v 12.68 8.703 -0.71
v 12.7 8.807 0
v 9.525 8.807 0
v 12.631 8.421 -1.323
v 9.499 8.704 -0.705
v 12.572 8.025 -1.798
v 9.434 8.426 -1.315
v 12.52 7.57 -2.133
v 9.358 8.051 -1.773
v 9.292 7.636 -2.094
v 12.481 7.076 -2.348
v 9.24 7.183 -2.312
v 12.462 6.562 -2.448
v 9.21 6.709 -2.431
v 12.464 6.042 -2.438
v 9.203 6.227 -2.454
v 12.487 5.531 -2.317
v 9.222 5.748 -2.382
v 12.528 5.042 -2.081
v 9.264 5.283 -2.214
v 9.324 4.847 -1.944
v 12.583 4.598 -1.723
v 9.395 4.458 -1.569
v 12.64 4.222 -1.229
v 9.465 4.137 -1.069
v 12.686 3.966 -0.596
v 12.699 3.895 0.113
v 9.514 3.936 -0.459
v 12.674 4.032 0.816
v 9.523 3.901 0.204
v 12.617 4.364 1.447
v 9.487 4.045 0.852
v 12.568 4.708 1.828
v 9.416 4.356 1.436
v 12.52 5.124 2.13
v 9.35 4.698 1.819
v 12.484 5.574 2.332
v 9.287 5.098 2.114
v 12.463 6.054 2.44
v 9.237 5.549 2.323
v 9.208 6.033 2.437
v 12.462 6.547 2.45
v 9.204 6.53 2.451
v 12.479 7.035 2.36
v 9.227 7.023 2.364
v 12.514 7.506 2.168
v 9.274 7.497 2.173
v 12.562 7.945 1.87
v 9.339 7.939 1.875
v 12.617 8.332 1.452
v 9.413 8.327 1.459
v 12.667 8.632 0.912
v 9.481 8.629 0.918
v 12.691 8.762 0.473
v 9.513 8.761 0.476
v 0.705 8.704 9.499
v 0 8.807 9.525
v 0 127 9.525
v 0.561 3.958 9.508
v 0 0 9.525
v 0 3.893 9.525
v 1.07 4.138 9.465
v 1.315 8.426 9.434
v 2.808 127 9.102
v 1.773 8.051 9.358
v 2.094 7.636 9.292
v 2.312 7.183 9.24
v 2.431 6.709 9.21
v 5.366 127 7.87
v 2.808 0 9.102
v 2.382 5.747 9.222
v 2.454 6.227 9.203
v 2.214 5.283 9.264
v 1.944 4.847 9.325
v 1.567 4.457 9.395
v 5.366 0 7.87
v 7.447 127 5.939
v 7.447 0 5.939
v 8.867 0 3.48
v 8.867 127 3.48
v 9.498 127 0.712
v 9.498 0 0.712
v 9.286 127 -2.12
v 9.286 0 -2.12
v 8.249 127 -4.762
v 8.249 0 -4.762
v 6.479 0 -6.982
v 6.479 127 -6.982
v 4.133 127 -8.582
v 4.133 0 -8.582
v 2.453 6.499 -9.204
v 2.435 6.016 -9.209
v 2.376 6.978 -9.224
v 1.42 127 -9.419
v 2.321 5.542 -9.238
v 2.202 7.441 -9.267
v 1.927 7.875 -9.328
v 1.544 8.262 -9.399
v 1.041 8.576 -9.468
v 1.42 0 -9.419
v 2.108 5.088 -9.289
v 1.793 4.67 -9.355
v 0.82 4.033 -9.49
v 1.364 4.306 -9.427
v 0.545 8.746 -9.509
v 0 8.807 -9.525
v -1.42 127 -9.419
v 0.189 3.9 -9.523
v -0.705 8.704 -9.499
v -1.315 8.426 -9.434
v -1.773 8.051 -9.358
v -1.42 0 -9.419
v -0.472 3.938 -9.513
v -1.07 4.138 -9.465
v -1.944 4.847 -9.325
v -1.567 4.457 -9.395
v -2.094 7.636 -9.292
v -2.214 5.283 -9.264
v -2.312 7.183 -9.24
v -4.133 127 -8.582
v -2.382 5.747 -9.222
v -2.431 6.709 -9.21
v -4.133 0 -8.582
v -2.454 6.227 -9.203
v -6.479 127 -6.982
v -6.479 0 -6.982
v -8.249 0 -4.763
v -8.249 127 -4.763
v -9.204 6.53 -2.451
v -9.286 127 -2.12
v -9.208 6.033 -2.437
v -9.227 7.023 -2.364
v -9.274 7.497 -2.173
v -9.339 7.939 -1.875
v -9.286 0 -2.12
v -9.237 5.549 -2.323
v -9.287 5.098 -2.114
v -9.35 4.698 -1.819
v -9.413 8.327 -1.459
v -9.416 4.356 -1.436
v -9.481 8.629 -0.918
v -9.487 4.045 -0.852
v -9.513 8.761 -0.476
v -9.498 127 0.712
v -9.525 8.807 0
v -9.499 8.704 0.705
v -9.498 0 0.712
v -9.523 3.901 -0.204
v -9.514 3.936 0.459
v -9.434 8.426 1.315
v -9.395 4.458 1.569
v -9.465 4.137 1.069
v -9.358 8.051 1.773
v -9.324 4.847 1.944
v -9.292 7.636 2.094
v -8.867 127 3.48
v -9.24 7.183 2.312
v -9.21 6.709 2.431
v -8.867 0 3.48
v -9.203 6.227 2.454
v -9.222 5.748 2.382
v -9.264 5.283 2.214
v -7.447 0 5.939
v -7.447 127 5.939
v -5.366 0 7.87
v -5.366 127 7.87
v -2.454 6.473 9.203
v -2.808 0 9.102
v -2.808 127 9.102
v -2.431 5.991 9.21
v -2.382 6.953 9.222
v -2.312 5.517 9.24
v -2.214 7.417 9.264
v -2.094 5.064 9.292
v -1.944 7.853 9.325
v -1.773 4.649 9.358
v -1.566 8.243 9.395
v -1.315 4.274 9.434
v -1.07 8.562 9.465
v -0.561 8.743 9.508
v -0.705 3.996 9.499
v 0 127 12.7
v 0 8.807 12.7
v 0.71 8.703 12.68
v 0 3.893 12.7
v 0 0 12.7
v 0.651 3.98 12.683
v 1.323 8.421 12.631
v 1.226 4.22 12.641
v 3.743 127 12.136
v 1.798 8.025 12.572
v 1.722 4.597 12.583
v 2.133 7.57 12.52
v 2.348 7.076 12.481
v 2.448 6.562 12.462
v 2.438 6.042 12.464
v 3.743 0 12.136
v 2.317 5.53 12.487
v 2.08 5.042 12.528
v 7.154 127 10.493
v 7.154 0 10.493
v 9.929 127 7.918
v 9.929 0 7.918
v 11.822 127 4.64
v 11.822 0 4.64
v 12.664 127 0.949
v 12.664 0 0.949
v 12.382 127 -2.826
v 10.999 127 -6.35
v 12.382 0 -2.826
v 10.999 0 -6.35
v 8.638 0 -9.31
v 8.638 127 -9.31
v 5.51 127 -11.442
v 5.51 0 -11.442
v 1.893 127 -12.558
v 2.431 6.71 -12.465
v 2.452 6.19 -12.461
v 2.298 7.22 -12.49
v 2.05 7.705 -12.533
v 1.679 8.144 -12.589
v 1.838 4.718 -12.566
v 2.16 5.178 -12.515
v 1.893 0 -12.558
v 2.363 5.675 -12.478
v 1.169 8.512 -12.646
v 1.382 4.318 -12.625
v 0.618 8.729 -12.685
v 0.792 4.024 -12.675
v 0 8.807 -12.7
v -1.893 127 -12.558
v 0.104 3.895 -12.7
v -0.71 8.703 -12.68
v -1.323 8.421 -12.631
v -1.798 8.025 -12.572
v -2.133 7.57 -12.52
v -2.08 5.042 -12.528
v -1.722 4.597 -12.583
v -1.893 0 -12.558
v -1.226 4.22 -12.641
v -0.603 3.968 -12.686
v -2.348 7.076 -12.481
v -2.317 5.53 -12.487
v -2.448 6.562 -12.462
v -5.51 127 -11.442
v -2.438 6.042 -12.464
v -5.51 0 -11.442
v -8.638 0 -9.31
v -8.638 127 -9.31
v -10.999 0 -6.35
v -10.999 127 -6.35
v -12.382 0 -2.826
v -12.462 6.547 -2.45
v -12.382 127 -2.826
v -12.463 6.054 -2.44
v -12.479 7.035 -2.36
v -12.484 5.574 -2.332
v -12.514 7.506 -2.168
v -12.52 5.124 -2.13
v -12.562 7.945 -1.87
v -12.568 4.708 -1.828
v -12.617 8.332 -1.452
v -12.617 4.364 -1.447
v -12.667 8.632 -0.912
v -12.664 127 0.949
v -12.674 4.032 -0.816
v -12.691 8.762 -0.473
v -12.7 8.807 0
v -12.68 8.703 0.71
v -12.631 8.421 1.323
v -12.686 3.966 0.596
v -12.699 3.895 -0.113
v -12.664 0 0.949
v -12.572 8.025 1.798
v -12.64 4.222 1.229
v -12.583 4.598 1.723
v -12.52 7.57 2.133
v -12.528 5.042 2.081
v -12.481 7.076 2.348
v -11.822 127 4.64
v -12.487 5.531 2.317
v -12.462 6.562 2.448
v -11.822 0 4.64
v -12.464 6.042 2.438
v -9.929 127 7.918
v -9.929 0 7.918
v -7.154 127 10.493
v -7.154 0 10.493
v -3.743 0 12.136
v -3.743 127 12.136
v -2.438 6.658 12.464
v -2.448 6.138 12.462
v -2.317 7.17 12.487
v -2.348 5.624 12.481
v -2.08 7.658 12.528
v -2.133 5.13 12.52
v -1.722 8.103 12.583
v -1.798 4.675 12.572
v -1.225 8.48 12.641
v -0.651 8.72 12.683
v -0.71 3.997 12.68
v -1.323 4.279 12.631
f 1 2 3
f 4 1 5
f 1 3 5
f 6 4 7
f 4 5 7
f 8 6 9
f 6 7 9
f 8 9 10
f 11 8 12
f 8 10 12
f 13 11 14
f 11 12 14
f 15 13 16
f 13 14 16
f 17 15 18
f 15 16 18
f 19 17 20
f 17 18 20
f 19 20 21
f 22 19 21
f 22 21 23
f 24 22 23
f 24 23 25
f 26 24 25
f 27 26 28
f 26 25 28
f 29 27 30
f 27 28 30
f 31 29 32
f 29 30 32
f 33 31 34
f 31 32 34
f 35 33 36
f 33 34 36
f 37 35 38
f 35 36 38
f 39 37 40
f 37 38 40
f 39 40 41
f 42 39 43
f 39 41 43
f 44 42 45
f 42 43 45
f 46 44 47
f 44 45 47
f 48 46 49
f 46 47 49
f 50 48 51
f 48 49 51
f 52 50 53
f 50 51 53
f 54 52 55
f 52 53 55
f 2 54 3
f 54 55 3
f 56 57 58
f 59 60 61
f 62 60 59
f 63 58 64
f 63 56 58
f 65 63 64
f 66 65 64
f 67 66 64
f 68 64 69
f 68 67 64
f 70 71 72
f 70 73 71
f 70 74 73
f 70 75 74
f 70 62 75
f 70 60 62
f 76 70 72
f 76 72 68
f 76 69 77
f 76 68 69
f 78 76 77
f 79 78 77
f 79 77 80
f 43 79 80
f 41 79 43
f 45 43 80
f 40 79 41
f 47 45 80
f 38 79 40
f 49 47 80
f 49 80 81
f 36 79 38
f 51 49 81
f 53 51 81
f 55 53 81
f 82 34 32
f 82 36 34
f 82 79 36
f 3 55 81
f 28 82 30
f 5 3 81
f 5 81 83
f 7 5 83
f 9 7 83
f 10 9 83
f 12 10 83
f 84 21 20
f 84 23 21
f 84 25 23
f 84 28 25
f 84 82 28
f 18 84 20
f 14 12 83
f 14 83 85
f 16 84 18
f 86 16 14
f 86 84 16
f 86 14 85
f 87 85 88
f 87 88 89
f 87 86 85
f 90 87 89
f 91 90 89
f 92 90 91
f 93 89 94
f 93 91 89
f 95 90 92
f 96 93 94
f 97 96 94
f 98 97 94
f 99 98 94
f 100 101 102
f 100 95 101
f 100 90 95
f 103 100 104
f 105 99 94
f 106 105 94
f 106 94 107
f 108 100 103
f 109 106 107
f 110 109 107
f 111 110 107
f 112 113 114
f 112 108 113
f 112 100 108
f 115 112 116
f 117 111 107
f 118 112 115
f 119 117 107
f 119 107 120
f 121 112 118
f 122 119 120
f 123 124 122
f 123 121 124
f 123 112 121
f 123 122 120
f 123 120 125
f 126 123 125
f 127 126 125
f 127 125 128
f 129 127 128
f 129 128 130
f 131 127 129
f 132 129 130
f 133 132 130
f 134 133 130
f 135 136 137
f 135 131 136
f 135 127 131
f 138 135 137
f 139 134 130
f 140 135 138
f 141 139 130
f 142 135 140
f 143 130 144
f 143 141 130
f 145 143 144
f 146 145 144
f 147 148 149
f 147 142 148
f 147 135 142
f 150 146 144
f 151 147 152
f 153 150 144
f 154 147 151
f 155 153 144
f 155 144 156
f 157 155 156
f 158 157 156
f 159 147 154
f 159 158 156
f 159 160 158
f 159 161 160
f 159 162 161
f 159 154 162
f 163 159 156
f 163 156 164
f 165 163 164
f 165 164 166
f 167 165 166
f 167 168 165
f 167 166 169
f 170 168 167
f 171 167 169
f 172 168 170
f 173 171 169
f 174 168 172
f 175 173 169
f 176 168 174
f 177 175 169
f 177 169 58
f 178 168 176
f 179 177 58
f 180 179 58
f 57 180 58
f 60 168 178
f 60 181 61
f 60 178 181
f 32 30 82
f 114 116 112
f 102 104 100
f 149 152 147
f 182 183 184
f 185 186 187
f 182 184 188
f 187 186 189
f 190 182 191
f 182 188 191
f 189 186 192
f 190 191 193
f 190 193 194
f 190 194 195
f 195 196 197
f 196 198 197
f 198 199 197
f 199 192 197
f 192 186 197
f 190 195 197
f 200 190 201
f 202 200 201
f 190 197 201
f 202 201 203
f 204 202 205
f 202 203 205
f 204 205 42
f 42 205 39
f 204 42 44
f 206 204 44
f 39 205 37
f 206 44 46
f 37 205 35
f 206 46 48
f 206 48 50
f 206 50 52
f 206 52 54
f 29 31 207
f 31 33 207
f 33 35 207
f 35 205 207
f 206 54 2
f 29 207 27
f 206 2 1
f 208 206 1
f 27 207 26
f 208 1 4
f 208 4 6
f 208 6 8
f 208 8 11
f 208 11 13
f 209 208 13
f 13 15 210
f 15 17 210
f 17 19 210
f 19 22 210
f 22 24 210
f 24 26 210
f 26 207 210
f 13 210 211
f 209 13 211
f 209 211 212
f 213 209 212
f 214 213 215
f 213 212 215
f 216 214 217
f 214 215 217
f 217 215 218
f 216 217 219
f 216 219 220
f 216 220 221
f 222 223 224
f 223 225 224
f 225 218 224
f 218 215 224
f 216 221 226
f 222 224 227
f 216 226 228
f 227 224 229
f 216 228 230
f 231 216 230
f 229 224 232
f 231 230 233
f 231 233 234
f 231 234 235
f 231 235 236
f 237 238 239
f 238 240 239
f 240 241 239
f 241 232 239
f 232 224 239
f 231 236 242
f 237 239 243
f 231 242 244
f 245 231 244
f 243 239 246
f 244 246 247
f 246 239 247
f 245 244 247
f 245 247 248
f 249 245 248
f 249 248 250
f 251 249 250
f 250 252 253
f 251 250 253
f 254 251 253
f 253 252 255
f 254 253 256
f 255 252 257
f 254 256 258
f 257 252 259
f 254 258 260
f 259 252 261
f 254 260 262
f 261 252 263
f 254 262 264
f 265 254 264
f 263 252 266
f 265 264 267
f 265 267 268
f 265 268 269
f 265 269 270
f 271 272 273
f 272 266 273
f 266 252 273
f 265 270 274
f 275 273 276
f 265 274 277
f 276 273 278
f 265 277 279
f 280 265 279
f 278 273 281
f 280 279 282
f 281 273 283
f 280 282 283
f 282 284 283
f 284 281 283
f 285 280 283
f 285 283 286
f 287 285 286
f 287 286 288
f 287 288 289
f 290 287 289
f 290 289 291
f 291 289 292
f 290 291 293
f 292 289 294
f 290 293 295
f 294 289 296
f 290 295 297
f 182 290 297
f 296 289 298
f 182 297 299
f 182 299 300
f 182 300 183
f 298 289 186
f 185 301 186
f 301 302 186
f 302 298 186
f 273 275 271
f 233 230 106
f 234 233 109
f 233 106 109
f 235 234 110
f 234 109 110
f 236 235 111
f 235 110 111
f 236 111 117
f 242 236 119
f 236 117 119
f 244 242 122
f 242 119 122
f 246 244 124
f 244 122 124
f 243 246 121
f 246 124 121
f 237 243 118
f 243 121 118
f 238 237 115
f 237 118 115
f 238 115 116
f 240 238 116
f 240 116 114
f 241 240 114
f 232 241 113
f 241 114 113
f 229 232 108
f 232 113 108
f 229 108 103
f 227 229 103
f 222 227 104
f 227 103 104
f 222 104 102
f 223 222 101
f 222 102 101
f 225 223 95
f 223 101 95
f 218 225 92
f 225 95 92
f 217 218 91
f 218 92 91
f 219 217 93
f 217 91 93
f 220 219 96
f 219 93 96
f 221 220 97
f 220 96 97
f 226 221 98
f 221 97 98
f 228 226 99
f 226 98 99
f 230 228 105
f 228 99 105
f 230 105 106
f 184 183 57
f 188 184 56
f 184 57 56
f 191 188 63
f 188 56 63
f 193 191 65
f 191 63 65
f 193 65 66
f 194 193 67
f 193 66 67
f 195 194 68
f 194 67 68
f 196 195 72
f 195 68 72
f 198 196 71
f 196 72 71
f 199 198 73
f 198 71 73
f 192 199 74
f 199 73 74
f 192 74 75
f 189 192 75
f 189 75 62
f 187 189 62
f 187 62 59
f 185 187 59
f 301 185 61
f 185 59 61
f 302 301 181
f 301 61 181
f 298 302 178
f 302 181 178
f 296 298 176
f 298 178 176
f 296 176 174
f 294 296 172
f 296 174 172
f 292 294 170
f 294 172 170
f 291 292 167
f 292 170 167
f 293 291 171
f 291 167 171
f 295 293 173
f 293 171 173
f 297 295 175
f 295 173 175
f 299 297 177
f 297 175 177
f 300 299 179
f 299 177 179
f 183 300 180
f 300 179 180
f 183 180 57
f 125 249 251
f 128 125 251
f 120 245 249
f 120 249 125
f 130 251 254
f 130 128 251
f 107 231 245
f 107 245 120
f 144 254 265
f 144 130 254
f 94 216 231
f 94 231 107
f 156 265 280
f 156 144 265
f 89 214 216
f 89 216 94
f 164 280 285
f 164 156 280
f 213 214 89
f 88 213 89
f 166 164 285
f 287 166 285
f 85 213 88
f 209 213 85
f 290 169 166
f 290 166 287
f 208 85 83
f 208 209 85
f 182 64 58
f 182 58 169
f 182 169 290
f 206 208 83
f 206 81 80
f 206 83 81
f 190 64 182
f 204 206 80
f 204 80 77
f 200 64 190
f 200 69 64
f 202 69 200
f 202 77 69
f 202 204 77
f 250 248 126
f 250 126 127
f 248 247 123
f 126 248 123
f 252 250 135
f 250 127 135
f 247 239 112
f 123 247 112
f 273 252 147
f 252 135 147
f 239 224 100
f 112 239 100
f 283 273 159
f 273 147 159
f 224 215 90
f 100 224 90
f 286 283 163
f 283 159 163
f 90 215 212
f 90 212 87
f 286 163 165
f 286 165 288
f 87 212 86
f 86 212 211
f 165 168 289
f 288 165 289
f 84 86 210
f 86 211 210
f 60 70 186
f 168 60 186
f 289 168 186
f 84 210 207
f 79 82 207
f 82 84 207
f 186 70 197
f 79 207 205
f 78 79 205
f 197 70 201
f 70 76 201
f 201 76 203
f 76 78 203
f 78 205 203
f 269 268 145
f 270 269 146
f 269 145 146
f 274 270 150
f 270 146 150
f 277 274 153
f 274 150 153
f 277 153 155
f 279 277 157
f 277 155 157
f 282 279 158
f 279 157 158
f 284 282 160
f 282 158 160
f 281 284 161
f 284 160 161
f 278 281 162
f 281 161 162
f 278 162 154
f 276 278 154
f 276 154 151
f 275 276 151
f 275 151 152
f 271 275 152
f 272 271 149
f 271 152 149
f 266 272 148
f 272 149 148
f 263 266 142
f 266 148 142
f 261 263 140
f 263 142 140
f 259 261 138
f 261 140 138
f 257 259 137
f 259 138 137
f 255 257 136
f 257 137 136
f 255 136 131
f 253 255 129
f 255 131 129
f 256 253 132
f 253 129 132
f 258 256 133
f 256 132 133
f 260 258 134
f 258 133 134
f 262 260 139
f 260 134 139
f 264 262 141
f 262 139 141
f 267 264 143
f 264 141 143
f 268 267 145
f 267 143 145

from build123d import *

# Parameters (mm, degrees)
SKETCH1_R          = 12.7
SKETCH1_R_2        = 9.525
ELTUBO_DEPTH       = 127
SETSCREW_OUTLINE_W = 2.45745
SETSCREW_OUTLINE_H = 3.497687322
CIRPATTERN1_COUNT  = 4


# Read off the part's stored shape, not the designer's step: SetScrew
with BuildPart() as part:
    # Sketch1 → ElTubo (new body)
    with BuildSketch(Plane(origin=(0, 0, 0), x_dir=(1, 0, 0), z_dir=(0, 1, 0))):
        with Locations(Location((0, 0, 0), (0, 0, 270))):
            Circle(SKETCH1_R)
        with Locations(Location((0, 0, 0), (0, 0, 270))):
            Circle(SKETCH1_R_2, mode=Mode.SUBTRACT)
    extrude(amount=ELTUBO_DEPTH)

    # SetScrew outline → SetScrew (revolve, cut)
    with BuildSketch(Plane(origin=(0, 6.35, 0), x_dir=(0, 1, 0), z_dir=(0, 0, -1))):
        with Locations((1.228725, -10.951191646)):
            Rectangle(SETSCREW_OUTLINE_W, SETSCREW_OUTLINE_H)
    setscrew = revolve(axis=Axis((0, 6.35, 0), (1, 0, 0)), mode=Mode.SUBTRACT)

    # CirPattern1: SetScrew ×4 about axis
    cirpattern1_axis = Axis((0, 127, 0), (0, -1, 0))
    for i in range(1, CIRPATTERN1_COUNT):
        add(setscrew.rotate(cirpattern1_axis, i * 360 / CIRPATTERN1_COUNT), mode=Mode.SUBTRACT)


solid = part.part
